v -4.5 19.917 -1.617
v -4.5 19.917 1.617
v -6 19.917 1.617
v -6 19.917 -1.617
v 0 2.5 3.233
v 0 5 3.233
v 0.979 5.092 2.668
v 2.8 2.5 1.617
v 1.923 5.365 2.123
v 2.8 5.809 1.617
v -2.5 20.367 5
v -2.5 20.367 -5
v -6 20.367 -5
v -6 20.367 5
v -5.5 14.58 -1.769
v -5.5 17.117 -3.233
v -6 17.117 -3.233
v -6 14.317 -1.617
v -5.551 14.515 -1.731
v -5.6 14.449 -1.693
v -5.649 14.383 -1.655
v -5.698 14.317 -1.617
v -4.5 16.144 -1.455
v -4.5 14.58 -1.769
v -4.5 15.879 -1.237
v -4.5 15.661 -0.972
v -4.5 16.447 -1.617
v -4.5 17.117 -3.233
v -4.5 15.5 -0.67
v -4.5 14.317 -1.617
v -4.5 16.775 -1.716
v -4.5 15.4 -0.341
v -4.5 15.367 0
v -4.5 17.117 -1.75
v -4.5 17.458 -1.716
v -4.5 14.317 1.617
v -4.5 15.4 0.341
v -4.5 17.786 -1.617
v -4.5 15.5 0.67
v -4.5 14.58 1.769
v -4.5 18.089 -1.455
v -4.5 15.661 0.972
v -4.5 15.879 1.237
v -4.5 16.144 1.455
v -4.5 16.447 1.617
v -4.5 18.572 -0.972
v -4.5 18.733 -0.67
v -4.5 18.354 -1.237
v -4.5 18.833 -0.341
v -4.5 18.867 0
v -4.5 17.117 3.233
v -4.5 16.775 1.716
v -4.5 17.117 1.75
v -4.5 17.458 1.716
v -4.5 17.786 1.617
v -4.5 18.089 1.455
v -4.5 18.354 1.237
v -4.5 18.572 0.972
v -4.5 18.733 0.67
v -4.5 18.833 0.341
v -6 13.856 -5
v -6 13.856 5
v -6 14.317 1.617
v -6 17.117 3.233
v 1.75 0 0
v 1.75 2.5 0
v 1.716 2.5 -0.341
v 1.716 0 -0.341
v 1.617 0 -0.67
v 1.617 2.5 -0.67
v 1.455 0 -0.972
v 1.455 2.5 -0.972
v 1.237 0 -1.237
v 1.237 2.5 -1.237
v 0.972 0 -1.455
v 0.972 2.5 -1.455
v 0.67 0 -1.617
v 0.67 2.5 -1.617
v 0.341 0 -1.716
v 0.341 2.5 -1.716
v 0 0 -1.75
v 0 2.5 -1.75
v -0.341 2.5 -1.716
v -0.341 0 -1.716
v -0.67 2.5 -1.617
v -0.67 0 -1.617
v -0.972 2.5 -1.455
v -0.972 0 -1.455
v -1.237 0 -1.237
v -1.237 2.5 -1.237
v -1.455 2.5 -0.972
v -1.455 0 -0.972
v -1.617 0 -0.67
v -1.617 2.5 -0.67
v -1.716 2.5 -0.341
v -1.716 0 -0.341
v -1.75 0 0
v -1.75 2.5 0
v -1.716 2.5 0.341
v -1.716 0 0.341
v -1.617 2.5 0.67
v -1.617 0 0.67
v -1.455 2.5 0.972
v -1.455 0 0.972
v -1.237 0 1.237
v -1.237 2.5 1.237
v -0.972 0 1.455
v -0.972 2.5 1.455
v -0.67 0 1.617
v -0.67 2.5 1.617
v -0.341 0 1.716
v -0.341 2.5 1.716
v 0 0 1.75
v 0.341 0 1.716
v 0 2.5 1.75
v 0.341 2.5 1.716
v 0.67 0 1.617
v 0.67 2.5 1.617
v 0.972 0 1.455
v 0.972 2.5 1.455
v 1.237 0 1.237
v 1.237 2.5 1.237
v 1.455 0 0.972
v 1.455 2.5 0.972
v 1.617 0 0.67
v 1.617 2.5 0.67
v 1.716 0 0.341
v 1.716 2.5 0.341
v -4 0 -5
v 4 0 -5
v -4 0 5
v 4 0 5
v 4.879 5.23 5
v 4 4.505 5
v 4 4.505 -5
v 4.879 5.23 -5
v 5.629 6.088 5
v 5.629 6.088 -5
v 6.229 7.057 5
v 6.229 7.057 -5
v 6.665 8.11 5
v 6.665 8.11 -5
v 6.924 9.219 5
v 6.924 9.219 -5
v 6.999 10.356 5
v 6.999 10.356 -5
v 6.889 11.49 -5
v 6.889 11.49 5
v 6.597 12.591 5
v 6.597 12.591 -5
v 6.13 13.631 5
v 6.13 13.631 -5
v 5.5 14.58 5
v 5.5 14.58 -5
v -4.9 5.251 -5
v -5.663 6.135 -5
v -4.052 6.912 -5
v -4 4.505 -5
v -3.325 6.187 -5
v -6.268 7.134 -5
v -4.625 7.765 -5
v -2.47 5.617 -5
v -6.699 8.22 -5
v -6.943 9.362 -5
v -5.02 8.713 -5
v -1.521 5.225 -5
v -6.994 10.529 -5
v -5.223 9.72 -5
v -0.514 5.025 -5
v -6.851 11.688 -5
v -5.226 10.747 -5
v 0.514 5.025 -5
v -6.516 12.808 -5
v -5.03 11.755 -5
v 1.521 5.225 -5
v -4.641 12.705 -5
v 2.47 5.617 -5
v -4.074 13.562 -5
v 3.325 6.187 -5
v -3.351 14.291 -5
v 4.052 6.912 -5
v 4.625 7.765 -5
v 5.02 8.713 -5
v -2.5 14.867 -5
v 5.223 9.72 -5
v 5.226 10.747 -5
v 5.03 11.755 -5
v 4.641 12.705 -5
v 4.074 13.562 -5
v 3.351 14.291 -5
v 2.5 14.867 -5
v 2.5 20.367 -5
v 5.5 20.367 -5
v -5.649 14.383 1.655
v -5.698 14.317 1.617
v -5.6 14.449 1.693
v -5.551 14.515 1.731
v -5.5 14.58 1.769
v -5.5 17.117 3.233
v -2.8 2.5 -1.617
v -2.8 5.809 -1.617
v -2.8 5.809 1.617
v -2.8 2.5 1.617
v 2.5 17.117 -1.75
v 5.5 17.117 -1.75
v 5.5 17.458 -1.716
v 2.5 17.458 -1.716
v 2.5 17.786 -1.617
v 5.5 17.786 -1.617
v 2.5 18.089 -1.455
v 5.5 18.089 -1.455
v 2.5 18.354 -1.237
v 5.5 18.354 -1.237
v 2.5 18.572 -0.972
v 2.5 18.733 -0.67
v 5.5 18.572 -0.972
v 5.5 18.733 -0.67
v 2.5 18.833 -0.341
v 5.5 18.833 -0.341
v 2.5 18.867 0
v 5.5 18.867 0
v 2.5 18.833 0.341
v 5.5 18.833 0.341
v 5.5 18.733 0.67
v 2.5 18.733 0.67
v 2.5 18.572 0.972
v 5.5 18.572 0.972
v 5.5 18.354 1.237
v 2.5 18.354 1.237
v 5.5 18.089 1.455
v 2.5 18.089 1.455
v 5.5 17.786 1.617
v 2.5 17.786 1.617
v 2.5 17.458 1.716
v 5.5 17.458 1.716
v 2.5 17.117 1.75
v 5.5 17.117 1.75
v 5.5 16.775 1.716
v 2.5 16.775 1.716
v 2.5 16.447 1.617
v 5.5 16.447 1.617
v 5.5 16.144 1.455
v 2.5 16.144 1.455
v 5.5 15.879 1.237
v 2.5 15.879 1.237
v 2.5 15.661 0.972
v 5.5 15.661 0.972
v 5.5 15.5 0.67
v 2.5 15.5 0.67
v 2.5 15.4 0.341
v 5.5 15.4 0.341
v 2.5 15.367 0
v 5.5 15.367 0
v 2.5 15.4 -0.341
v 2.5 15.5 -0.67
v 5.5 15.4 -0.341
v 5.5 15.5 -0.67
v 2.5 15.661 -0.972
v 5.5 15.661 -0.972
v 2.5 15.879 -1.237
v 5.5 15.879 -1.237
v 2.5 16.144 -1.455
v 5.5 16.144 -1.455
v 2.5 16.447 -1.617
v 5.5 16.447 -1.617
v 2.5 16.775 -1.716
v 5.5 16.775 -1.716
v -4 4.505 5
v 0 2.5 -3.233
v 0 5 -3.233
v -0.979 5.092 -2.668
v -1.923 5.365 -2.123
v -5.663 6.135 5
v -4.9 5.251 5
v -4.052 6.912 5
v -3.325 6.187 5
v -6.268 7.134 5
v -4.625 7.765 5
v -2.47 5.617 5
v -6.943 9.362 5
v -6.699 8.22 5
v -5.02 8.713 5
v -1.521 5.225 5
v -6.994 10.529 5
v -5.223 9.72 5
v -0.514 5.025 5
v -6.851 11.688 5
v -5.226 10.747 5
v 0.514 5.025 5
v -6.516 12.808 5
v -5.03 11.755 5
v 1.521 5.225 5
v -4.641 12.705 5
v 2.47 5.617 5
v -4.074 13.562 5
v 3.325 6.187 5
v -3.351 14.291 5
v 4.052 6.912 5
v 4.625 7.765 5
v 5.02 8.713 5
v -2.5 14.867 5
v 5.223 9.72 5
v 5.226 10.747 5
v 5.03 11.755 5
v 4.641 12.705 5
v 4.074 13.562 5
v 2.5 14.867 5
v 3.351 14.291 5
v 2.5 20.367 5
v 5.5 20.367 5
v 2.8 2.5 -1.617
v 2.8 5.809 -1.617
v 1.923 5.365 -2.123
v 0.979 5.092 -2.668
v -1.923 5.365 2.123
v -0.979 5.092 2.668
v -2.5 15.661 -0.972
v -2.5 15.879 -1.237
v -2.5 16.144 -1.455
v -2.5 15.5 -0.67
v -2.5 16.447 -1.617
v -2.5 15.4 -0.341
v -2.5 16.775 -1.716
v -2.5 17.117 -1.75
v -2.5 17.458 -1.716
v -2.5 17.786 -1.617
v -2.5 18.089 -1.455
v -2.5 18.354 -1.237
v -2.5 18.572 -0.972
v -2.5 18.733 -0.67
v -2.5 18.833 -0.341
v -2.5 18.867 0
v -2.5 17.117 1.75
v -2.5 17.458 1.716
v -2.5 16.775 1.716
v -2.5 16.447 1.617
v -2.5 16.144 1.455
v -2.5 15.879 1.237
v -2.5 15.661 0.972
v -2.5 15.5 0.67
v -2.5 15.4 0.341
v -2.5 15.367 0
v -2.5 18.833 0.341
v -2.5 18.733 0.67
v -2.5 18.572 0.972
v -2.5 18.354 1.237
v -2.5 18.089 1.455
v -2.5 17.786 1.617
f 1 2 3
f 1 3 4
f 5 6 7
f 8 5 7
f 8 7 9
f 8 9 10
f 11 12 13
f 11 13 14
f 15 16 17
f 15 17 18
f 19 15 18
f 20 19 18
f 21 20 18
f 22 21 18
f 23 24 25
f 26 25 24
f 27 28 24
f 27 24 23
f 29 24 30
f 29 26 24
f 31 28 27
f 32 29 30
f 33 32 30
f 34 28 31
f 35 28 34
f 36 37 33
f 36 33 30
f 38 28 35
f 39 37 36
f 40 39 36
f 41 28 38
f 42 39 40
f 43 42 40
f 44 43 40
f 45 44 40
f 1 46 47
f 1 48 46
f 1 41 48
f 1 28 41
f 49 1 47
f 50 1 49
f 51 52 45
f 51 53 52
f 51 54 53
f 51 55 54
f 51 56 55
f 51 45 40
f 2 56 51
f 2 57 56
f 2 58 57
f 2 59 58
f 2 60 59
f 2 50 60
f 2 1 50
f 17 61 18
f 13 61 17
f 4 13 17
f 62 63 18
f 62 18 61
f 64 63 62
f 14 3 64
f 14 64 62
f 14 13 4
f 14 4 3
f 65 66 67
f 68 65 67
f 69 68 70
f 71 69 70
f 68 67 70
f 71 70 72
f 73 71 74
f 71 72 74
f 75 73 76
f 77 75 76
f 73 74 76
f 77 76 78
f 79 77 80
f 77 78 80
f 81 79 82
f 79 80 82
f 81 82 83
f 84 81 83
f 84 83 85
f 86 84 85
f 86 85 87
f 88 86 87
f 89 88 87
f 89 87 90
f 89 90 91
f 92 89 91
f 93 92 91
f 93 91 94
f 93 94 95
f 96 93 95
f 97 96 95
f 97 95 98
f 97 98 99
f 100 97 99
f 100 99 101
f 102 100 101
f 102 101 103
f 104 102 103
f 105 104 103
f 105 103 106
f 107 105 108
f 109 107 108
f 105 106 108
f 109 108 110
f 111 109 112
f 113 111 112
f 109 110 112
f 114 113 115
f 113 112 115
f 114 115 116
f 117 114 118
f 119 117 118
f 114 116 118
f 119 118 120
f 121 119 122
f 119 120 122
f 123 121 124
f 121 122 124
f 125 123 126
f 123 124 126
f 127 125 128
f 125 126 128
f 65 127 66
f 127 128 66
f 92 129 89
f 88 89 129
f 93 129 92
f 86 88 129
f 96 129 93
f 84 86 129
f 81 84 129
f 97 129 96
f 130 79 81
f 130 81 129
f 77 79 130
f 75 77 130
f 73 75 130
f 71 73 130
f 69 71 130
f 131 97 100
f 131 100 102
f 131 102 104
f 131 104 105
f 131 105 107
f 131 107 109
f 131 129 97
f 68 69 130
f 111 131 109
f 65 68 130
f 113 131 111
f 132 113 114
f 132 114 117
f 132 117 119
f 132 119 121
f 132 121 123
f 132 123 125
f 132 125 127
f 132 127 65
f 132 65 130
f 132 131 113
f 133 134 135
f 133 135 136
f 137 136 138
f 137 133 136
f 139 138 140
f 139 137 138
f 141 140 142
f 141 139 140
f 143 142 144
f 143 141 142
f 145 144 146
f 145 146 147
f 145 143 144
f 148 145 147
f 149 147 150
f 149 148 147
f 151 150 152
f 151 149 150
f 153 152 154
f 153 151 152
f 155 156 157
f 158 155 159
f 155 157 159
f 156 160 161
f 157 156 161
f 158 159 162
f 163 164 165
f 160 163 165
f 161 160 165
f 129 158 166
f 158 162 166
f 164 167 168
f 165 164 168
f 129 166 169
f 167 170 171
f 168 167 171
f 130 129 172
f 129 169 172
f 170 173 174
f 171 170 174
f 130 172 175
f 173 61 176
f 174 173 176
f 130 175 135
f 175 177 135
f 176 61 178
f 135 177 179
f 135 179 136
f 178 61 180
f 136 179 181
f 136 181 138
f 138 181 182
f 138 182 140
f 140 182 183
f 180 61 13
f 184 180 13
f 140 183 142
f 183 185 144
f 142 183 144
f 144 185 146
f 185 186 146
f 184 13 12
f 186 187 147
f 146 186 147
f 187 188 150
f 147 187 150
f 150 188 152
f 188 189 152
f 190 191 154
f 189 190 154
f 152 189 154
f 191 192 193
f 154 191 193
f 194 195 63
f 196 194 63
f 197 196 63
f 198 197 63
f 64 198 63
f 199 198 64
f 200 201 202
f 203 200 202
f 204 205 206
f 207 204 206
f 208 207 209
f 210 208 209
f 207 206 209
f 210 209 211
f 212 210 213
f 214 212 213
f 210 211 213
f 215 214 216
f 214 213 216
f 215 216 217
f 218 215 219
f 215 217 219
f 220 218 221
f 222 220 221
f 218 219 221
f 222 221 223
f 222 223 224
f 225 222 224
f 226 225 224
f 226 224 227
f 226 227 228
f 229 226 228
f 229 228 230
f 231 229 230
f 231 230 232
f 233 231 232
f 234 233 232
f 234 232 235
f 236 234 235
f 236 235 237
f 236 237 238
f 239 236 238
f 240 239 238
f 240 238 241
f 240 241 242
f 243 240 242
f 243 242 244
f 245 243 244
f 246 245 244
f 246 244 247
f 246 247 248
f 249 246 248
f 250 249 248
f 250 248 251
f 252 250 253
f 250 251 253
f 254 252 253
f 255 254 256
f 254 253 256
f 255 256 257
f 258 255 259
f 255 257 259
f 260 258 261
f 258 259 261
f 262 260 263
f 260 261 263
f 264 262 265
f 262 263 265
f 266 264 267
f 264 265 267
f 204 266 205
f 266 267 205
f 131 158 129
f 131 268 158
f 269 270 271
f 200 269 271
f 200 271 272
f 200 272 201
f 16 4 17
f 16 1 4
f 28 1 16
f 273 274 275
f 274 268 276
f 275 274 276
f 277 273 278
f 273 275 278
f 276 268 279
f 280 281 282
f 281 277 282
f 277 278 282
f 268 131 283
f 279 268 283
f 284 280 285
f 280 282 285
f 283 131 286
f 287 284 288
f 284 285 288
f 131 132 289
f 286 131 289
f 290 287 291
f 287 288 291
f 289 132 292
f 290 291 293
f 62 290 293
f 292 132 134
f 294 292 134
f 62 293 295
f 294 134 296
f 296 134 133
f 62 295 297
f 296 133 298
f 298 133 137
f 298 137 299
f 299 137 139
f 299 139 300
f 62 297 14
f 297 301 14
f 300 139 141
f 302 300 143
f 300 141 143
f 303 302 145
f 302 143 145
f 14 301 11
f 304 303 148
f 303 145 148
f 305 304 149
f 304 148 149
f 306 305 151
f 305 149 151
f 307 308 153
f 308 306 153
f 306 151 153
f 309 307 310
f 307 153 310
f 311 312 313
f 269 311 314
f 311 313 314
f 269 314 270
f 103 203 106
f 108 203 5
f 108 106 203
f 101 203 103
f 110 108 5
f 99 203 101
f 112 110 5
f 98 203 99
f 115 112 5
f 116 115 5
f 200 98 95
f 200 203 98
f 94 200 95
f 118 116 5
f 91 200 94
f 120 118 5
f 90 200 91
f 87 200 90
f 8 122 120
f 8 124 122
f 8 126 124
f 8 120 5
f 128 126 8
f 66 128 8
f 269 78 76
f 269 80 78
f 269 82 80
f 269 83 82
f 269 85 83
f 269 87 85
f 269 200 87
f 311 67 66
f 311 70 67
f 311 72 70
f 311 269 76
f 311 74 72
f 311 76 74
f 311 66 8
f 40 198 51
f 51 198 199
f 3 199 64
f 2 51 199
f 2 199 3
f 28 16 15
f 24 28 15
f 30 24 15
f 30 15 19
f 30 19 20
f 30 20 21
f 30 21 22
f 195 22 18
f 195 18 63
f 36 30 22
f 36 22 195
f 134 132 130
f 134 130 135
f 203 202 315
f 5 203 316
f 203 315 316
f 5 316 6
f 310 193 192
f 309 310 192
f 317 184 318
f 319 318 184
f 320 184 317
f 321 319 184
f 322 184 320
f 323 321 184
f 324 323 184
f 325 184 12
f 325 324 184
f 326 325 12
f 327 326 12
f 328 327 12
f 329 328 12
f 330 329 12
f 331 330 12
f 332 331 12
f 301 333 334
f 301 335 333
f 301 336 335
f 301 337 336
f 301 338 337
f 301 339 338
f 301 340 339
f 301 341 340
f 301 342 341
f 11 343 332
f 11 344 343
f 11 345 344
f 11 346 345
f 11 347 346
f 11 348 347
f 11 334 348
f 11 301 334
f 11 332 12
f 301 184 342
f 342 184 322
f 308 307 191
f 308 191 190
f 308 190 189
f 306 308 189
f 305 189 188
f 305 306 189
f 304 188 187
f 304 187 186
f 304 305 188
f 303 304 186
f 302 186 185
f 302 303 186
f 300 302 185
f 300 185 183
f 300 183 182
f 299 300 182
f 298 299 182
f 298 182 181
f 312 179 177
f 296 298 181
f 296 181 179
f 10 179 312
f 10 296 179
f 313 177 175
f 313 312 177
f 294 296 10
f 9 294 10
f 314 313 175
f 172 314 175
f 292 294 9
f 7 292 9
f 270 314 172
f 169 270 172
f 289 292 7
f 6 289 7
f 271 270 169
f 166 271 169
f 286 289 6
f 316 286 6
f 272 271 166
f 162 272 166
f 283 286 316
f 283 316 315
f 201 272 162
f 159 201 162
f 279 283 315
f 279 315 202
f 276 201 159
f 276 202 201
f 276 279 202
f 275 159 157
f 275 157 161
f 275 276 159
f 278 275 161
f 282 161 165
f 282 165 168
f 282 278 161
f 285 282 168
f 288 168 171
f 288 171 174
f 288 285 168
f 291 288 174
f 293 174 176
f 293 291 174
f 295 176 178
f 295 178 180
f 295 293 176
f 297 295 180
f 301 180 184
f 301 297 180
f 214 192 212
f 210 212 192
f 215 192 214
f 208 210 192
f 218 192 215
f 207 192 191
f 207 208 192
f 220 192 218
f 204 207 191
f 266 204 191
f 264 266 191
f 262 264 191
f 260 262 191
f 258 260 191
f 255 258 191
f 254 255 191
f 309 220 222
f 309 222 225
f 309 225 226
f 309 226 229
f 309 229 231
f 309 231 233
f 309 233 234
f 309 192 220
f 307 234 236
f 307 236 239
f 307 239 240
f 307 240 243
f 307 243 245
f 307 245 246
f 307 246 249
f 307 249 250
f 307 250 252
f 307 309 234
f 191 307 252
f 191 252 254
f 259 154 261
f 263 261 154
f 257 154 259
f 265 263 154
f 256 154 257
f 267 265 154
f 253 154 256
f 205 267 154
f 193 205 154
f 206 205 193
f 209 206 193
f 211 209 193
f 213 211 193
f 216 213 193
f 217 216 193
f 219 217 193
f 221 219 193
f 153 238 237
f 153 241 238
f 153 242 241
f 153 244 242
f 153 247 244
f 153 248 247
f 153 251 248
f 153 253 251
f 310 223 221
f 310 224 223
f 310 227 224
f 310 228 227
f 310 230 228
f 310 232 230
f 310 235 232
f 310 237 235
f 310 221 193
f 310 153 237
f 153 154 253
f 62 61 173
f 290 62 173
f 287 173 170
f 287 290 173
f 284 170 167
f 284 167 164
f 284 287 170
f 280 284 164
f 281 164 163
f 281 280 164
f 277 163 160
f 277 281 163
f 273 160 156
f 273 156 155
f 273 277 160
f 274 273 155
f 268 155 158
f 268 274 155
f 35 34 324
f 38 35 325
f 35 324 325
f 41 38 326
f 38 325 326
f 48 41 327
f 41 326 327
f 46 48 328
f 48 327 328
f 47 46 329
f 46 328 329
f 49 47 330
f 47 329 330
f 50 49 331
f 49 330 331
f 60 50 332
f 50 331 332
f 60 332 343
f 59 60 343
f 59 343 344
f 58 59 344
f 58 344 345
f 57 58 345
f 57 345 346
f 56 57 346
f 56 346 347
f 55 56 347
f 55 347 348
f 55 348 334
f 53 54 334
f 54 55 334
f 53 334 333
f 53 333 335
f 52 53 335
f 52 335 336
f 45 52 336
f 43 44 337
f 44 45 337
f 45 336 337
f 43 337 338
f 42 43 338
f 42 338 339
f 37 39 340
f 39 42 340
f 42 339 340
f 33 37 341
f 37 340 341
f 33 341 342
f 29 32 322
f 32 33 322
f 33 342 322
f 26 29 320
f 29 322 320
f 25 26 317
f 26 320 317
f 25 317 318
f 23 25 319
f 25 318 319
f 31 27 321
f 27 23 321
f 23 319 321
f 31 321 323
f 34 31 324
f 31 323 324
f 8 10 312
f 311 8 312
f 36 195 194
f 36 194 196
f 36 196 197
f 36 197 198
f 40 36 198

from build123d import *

# Parameters (mm, degrees)
RESSALTO_EXTRUS_O1_DEPTH   = 5
CORTE_EXTRUS_O1_START      = -10
CORTE_EXTRUS_O1_DEPTH      = 7.866546
ESBO_O4_R                  = 1.75
CORTE_EXTRUS_O2_DEPTH      = 21.366546328
ESBO_O5_R                  = 1.75
CORTE_EXTRUS_O3_DEPTH      = 2.5
CORTE_EXTRUS_O3_DEPTH_BACK = 13.5
ESBO_O6_W                  = 10
ESBO_O6_H                  = 7.25
RESSALTO_EXTRUS_O2_DEPTH   = 0.5
ESBO_O6_2_R                = 1.75
CORTE_EXTRUS_O4_DEPTH      = 1.5
CORTE_EXTRUS_O4_DEPTH_BACK = 1


with BuildPart() as part:
    # Esboço1 → Ressalto-extrusão1 (new body, symmetric)
    with BuildSketch(Plane.XY):
        with BuildLine():
            Line((-4, 0), (4, 0))
            Line((4, 0), (4, 4.505437353))
            ThreePointArc((4, 4.505437353), (6.923679872, 9.219147423), (5.5, 14.580127019))
            Line((5.5, 14.580127019), (5.5, 20.366546328))
            Line((5.5, 20.366546328), (2.5, 20.366546328))
            Line((2.5, 20.366546328), (2.5, 14.866546328))
            ThreePointArc((2.5, 14.866546328), (0, 5), (-2.5, 14.866546328))
            Line((-2.5, 14.866546328), (-2.5, 20.366546328))
            Line((-2.5, 20.366546328), (-5.5, 20.366546328))
            Line((-5.5, 20.366546328), (-5.5, 14.580127019))
            ThreePointArc((-5.5, 14.580127019), (-6.923679872, 9.219147423), (-4, 4.505437353))
            Line((-4, 4.505437353), (-4, 0))
        make_face()
    extrude(amount=RESSALTO_EXTRUS_O1_DEPTH, both=True)

    # Esboço3 → Corte-extrusão1 (cut)
    with BuildSketch(Plane(origin=(0, 20.366546328, 0), x_dir=(1, 0, 0), z_dir=(0, 1, 0)).offset(CORTE_EXTRUS_O1_START)):
        Polygon((0, 3.233161507), (-2.8, 1.616580754), (-2.8, -1.616580754), (0, -3.233161507), (2.8, -1.616580754), (2.8, 1.616580754), align=None)
    extrude(amount=-CORTE_EXTRUS_O1_DEPTH, mode=Mode.SUBTRACT)

    # Esboço4 → Corte-extrusão2 (cut, through all)
    with BuildSketch(Plane(origin=(0, 20.366546328, 0), x_dir=(1, 0, 0), z_dir=(0, 1, 0))):
        Circle(ESBO_O4_R)
    extrude(amount=-CORTE_EXTRUS_O2_DEPTH, mode=Mode.SUBTRACT)

    # Esboço5 → Corte-extrusão3 (cut, two sides)
    with BuildSketch(Plane(origin=(5.5, 0, 0), x_dir=(0, 0, -1), z_dir=(1, 0, 0))) as corte_extrus_o3_sk:
        with Locations((0, 17.116546328)):
            Circle(ESBO_O5_R)
    extrude(amount=CORTE_EXTRUS_O3_DEPTH, mode=Mode.SUBTRACT)
    extrude(corte_extrus_o3_sk.sketch, amount=-CORTE_EXTRUS_O3_DEPTH_BACK, mode=Mode.SUBTRACT)

    # Esboço6 → Ressalto-extrusão2 (add)
    with BuildSketch(Plane.ZY.offset(5.5)):
        with Locations((0, 16.741546328)):
            Rectangle(ESBO_O6_W, ESBO_O6_H)
        Polygon((3.233161507, 17.116546328), (1.616580754, 19.916546328), (-1.616580754, 19.916546328), (-3.233161507, 17.116546328), (-1.616580754, 14.316546328), (1.616580754, 14.316546328), align=None, mode=Mode.SUBTRACT)
    extrude(amount=RESSALTO_EXTRUS_O2_DEPTH)

    # Esboço6<2> → Corte-extrusão4 (cut, two sides)
    with BuildSketch(Plane.ZY.offset(5.5)) as corte_extrus_o4_sk:
        Polygon((-3.233161507, 17.116546328), (-1.768759136, 14.580127019), (1.768759136, 14.580127019), (3.233161507, 17.116546328), (1.616580754, 19.916546328), (-1.616580754, 19.916546328), align=None)
        with Locations((0, 17.116546328)):
            Circle(ESBO_O6_2_R, mode=Mode.SUBTRACT)
        Polygon((1.768759136, 14.580127019), (-1.768759136, 14.580127019), (-1.616580754, 14.316546328), (1.616580754, 14.316546328), align=None)
    extrude(amount=CORTE_EXTRUS_O4_DEPTH, mode=Mode.SUBTRACT)
    extrude(corte_extrus_o4_sk.sketch, amount=-CORTE_EXTRUS_O4_DEPTH_BACK, mode=Mode.SUBTRACT)


solid = part.part
